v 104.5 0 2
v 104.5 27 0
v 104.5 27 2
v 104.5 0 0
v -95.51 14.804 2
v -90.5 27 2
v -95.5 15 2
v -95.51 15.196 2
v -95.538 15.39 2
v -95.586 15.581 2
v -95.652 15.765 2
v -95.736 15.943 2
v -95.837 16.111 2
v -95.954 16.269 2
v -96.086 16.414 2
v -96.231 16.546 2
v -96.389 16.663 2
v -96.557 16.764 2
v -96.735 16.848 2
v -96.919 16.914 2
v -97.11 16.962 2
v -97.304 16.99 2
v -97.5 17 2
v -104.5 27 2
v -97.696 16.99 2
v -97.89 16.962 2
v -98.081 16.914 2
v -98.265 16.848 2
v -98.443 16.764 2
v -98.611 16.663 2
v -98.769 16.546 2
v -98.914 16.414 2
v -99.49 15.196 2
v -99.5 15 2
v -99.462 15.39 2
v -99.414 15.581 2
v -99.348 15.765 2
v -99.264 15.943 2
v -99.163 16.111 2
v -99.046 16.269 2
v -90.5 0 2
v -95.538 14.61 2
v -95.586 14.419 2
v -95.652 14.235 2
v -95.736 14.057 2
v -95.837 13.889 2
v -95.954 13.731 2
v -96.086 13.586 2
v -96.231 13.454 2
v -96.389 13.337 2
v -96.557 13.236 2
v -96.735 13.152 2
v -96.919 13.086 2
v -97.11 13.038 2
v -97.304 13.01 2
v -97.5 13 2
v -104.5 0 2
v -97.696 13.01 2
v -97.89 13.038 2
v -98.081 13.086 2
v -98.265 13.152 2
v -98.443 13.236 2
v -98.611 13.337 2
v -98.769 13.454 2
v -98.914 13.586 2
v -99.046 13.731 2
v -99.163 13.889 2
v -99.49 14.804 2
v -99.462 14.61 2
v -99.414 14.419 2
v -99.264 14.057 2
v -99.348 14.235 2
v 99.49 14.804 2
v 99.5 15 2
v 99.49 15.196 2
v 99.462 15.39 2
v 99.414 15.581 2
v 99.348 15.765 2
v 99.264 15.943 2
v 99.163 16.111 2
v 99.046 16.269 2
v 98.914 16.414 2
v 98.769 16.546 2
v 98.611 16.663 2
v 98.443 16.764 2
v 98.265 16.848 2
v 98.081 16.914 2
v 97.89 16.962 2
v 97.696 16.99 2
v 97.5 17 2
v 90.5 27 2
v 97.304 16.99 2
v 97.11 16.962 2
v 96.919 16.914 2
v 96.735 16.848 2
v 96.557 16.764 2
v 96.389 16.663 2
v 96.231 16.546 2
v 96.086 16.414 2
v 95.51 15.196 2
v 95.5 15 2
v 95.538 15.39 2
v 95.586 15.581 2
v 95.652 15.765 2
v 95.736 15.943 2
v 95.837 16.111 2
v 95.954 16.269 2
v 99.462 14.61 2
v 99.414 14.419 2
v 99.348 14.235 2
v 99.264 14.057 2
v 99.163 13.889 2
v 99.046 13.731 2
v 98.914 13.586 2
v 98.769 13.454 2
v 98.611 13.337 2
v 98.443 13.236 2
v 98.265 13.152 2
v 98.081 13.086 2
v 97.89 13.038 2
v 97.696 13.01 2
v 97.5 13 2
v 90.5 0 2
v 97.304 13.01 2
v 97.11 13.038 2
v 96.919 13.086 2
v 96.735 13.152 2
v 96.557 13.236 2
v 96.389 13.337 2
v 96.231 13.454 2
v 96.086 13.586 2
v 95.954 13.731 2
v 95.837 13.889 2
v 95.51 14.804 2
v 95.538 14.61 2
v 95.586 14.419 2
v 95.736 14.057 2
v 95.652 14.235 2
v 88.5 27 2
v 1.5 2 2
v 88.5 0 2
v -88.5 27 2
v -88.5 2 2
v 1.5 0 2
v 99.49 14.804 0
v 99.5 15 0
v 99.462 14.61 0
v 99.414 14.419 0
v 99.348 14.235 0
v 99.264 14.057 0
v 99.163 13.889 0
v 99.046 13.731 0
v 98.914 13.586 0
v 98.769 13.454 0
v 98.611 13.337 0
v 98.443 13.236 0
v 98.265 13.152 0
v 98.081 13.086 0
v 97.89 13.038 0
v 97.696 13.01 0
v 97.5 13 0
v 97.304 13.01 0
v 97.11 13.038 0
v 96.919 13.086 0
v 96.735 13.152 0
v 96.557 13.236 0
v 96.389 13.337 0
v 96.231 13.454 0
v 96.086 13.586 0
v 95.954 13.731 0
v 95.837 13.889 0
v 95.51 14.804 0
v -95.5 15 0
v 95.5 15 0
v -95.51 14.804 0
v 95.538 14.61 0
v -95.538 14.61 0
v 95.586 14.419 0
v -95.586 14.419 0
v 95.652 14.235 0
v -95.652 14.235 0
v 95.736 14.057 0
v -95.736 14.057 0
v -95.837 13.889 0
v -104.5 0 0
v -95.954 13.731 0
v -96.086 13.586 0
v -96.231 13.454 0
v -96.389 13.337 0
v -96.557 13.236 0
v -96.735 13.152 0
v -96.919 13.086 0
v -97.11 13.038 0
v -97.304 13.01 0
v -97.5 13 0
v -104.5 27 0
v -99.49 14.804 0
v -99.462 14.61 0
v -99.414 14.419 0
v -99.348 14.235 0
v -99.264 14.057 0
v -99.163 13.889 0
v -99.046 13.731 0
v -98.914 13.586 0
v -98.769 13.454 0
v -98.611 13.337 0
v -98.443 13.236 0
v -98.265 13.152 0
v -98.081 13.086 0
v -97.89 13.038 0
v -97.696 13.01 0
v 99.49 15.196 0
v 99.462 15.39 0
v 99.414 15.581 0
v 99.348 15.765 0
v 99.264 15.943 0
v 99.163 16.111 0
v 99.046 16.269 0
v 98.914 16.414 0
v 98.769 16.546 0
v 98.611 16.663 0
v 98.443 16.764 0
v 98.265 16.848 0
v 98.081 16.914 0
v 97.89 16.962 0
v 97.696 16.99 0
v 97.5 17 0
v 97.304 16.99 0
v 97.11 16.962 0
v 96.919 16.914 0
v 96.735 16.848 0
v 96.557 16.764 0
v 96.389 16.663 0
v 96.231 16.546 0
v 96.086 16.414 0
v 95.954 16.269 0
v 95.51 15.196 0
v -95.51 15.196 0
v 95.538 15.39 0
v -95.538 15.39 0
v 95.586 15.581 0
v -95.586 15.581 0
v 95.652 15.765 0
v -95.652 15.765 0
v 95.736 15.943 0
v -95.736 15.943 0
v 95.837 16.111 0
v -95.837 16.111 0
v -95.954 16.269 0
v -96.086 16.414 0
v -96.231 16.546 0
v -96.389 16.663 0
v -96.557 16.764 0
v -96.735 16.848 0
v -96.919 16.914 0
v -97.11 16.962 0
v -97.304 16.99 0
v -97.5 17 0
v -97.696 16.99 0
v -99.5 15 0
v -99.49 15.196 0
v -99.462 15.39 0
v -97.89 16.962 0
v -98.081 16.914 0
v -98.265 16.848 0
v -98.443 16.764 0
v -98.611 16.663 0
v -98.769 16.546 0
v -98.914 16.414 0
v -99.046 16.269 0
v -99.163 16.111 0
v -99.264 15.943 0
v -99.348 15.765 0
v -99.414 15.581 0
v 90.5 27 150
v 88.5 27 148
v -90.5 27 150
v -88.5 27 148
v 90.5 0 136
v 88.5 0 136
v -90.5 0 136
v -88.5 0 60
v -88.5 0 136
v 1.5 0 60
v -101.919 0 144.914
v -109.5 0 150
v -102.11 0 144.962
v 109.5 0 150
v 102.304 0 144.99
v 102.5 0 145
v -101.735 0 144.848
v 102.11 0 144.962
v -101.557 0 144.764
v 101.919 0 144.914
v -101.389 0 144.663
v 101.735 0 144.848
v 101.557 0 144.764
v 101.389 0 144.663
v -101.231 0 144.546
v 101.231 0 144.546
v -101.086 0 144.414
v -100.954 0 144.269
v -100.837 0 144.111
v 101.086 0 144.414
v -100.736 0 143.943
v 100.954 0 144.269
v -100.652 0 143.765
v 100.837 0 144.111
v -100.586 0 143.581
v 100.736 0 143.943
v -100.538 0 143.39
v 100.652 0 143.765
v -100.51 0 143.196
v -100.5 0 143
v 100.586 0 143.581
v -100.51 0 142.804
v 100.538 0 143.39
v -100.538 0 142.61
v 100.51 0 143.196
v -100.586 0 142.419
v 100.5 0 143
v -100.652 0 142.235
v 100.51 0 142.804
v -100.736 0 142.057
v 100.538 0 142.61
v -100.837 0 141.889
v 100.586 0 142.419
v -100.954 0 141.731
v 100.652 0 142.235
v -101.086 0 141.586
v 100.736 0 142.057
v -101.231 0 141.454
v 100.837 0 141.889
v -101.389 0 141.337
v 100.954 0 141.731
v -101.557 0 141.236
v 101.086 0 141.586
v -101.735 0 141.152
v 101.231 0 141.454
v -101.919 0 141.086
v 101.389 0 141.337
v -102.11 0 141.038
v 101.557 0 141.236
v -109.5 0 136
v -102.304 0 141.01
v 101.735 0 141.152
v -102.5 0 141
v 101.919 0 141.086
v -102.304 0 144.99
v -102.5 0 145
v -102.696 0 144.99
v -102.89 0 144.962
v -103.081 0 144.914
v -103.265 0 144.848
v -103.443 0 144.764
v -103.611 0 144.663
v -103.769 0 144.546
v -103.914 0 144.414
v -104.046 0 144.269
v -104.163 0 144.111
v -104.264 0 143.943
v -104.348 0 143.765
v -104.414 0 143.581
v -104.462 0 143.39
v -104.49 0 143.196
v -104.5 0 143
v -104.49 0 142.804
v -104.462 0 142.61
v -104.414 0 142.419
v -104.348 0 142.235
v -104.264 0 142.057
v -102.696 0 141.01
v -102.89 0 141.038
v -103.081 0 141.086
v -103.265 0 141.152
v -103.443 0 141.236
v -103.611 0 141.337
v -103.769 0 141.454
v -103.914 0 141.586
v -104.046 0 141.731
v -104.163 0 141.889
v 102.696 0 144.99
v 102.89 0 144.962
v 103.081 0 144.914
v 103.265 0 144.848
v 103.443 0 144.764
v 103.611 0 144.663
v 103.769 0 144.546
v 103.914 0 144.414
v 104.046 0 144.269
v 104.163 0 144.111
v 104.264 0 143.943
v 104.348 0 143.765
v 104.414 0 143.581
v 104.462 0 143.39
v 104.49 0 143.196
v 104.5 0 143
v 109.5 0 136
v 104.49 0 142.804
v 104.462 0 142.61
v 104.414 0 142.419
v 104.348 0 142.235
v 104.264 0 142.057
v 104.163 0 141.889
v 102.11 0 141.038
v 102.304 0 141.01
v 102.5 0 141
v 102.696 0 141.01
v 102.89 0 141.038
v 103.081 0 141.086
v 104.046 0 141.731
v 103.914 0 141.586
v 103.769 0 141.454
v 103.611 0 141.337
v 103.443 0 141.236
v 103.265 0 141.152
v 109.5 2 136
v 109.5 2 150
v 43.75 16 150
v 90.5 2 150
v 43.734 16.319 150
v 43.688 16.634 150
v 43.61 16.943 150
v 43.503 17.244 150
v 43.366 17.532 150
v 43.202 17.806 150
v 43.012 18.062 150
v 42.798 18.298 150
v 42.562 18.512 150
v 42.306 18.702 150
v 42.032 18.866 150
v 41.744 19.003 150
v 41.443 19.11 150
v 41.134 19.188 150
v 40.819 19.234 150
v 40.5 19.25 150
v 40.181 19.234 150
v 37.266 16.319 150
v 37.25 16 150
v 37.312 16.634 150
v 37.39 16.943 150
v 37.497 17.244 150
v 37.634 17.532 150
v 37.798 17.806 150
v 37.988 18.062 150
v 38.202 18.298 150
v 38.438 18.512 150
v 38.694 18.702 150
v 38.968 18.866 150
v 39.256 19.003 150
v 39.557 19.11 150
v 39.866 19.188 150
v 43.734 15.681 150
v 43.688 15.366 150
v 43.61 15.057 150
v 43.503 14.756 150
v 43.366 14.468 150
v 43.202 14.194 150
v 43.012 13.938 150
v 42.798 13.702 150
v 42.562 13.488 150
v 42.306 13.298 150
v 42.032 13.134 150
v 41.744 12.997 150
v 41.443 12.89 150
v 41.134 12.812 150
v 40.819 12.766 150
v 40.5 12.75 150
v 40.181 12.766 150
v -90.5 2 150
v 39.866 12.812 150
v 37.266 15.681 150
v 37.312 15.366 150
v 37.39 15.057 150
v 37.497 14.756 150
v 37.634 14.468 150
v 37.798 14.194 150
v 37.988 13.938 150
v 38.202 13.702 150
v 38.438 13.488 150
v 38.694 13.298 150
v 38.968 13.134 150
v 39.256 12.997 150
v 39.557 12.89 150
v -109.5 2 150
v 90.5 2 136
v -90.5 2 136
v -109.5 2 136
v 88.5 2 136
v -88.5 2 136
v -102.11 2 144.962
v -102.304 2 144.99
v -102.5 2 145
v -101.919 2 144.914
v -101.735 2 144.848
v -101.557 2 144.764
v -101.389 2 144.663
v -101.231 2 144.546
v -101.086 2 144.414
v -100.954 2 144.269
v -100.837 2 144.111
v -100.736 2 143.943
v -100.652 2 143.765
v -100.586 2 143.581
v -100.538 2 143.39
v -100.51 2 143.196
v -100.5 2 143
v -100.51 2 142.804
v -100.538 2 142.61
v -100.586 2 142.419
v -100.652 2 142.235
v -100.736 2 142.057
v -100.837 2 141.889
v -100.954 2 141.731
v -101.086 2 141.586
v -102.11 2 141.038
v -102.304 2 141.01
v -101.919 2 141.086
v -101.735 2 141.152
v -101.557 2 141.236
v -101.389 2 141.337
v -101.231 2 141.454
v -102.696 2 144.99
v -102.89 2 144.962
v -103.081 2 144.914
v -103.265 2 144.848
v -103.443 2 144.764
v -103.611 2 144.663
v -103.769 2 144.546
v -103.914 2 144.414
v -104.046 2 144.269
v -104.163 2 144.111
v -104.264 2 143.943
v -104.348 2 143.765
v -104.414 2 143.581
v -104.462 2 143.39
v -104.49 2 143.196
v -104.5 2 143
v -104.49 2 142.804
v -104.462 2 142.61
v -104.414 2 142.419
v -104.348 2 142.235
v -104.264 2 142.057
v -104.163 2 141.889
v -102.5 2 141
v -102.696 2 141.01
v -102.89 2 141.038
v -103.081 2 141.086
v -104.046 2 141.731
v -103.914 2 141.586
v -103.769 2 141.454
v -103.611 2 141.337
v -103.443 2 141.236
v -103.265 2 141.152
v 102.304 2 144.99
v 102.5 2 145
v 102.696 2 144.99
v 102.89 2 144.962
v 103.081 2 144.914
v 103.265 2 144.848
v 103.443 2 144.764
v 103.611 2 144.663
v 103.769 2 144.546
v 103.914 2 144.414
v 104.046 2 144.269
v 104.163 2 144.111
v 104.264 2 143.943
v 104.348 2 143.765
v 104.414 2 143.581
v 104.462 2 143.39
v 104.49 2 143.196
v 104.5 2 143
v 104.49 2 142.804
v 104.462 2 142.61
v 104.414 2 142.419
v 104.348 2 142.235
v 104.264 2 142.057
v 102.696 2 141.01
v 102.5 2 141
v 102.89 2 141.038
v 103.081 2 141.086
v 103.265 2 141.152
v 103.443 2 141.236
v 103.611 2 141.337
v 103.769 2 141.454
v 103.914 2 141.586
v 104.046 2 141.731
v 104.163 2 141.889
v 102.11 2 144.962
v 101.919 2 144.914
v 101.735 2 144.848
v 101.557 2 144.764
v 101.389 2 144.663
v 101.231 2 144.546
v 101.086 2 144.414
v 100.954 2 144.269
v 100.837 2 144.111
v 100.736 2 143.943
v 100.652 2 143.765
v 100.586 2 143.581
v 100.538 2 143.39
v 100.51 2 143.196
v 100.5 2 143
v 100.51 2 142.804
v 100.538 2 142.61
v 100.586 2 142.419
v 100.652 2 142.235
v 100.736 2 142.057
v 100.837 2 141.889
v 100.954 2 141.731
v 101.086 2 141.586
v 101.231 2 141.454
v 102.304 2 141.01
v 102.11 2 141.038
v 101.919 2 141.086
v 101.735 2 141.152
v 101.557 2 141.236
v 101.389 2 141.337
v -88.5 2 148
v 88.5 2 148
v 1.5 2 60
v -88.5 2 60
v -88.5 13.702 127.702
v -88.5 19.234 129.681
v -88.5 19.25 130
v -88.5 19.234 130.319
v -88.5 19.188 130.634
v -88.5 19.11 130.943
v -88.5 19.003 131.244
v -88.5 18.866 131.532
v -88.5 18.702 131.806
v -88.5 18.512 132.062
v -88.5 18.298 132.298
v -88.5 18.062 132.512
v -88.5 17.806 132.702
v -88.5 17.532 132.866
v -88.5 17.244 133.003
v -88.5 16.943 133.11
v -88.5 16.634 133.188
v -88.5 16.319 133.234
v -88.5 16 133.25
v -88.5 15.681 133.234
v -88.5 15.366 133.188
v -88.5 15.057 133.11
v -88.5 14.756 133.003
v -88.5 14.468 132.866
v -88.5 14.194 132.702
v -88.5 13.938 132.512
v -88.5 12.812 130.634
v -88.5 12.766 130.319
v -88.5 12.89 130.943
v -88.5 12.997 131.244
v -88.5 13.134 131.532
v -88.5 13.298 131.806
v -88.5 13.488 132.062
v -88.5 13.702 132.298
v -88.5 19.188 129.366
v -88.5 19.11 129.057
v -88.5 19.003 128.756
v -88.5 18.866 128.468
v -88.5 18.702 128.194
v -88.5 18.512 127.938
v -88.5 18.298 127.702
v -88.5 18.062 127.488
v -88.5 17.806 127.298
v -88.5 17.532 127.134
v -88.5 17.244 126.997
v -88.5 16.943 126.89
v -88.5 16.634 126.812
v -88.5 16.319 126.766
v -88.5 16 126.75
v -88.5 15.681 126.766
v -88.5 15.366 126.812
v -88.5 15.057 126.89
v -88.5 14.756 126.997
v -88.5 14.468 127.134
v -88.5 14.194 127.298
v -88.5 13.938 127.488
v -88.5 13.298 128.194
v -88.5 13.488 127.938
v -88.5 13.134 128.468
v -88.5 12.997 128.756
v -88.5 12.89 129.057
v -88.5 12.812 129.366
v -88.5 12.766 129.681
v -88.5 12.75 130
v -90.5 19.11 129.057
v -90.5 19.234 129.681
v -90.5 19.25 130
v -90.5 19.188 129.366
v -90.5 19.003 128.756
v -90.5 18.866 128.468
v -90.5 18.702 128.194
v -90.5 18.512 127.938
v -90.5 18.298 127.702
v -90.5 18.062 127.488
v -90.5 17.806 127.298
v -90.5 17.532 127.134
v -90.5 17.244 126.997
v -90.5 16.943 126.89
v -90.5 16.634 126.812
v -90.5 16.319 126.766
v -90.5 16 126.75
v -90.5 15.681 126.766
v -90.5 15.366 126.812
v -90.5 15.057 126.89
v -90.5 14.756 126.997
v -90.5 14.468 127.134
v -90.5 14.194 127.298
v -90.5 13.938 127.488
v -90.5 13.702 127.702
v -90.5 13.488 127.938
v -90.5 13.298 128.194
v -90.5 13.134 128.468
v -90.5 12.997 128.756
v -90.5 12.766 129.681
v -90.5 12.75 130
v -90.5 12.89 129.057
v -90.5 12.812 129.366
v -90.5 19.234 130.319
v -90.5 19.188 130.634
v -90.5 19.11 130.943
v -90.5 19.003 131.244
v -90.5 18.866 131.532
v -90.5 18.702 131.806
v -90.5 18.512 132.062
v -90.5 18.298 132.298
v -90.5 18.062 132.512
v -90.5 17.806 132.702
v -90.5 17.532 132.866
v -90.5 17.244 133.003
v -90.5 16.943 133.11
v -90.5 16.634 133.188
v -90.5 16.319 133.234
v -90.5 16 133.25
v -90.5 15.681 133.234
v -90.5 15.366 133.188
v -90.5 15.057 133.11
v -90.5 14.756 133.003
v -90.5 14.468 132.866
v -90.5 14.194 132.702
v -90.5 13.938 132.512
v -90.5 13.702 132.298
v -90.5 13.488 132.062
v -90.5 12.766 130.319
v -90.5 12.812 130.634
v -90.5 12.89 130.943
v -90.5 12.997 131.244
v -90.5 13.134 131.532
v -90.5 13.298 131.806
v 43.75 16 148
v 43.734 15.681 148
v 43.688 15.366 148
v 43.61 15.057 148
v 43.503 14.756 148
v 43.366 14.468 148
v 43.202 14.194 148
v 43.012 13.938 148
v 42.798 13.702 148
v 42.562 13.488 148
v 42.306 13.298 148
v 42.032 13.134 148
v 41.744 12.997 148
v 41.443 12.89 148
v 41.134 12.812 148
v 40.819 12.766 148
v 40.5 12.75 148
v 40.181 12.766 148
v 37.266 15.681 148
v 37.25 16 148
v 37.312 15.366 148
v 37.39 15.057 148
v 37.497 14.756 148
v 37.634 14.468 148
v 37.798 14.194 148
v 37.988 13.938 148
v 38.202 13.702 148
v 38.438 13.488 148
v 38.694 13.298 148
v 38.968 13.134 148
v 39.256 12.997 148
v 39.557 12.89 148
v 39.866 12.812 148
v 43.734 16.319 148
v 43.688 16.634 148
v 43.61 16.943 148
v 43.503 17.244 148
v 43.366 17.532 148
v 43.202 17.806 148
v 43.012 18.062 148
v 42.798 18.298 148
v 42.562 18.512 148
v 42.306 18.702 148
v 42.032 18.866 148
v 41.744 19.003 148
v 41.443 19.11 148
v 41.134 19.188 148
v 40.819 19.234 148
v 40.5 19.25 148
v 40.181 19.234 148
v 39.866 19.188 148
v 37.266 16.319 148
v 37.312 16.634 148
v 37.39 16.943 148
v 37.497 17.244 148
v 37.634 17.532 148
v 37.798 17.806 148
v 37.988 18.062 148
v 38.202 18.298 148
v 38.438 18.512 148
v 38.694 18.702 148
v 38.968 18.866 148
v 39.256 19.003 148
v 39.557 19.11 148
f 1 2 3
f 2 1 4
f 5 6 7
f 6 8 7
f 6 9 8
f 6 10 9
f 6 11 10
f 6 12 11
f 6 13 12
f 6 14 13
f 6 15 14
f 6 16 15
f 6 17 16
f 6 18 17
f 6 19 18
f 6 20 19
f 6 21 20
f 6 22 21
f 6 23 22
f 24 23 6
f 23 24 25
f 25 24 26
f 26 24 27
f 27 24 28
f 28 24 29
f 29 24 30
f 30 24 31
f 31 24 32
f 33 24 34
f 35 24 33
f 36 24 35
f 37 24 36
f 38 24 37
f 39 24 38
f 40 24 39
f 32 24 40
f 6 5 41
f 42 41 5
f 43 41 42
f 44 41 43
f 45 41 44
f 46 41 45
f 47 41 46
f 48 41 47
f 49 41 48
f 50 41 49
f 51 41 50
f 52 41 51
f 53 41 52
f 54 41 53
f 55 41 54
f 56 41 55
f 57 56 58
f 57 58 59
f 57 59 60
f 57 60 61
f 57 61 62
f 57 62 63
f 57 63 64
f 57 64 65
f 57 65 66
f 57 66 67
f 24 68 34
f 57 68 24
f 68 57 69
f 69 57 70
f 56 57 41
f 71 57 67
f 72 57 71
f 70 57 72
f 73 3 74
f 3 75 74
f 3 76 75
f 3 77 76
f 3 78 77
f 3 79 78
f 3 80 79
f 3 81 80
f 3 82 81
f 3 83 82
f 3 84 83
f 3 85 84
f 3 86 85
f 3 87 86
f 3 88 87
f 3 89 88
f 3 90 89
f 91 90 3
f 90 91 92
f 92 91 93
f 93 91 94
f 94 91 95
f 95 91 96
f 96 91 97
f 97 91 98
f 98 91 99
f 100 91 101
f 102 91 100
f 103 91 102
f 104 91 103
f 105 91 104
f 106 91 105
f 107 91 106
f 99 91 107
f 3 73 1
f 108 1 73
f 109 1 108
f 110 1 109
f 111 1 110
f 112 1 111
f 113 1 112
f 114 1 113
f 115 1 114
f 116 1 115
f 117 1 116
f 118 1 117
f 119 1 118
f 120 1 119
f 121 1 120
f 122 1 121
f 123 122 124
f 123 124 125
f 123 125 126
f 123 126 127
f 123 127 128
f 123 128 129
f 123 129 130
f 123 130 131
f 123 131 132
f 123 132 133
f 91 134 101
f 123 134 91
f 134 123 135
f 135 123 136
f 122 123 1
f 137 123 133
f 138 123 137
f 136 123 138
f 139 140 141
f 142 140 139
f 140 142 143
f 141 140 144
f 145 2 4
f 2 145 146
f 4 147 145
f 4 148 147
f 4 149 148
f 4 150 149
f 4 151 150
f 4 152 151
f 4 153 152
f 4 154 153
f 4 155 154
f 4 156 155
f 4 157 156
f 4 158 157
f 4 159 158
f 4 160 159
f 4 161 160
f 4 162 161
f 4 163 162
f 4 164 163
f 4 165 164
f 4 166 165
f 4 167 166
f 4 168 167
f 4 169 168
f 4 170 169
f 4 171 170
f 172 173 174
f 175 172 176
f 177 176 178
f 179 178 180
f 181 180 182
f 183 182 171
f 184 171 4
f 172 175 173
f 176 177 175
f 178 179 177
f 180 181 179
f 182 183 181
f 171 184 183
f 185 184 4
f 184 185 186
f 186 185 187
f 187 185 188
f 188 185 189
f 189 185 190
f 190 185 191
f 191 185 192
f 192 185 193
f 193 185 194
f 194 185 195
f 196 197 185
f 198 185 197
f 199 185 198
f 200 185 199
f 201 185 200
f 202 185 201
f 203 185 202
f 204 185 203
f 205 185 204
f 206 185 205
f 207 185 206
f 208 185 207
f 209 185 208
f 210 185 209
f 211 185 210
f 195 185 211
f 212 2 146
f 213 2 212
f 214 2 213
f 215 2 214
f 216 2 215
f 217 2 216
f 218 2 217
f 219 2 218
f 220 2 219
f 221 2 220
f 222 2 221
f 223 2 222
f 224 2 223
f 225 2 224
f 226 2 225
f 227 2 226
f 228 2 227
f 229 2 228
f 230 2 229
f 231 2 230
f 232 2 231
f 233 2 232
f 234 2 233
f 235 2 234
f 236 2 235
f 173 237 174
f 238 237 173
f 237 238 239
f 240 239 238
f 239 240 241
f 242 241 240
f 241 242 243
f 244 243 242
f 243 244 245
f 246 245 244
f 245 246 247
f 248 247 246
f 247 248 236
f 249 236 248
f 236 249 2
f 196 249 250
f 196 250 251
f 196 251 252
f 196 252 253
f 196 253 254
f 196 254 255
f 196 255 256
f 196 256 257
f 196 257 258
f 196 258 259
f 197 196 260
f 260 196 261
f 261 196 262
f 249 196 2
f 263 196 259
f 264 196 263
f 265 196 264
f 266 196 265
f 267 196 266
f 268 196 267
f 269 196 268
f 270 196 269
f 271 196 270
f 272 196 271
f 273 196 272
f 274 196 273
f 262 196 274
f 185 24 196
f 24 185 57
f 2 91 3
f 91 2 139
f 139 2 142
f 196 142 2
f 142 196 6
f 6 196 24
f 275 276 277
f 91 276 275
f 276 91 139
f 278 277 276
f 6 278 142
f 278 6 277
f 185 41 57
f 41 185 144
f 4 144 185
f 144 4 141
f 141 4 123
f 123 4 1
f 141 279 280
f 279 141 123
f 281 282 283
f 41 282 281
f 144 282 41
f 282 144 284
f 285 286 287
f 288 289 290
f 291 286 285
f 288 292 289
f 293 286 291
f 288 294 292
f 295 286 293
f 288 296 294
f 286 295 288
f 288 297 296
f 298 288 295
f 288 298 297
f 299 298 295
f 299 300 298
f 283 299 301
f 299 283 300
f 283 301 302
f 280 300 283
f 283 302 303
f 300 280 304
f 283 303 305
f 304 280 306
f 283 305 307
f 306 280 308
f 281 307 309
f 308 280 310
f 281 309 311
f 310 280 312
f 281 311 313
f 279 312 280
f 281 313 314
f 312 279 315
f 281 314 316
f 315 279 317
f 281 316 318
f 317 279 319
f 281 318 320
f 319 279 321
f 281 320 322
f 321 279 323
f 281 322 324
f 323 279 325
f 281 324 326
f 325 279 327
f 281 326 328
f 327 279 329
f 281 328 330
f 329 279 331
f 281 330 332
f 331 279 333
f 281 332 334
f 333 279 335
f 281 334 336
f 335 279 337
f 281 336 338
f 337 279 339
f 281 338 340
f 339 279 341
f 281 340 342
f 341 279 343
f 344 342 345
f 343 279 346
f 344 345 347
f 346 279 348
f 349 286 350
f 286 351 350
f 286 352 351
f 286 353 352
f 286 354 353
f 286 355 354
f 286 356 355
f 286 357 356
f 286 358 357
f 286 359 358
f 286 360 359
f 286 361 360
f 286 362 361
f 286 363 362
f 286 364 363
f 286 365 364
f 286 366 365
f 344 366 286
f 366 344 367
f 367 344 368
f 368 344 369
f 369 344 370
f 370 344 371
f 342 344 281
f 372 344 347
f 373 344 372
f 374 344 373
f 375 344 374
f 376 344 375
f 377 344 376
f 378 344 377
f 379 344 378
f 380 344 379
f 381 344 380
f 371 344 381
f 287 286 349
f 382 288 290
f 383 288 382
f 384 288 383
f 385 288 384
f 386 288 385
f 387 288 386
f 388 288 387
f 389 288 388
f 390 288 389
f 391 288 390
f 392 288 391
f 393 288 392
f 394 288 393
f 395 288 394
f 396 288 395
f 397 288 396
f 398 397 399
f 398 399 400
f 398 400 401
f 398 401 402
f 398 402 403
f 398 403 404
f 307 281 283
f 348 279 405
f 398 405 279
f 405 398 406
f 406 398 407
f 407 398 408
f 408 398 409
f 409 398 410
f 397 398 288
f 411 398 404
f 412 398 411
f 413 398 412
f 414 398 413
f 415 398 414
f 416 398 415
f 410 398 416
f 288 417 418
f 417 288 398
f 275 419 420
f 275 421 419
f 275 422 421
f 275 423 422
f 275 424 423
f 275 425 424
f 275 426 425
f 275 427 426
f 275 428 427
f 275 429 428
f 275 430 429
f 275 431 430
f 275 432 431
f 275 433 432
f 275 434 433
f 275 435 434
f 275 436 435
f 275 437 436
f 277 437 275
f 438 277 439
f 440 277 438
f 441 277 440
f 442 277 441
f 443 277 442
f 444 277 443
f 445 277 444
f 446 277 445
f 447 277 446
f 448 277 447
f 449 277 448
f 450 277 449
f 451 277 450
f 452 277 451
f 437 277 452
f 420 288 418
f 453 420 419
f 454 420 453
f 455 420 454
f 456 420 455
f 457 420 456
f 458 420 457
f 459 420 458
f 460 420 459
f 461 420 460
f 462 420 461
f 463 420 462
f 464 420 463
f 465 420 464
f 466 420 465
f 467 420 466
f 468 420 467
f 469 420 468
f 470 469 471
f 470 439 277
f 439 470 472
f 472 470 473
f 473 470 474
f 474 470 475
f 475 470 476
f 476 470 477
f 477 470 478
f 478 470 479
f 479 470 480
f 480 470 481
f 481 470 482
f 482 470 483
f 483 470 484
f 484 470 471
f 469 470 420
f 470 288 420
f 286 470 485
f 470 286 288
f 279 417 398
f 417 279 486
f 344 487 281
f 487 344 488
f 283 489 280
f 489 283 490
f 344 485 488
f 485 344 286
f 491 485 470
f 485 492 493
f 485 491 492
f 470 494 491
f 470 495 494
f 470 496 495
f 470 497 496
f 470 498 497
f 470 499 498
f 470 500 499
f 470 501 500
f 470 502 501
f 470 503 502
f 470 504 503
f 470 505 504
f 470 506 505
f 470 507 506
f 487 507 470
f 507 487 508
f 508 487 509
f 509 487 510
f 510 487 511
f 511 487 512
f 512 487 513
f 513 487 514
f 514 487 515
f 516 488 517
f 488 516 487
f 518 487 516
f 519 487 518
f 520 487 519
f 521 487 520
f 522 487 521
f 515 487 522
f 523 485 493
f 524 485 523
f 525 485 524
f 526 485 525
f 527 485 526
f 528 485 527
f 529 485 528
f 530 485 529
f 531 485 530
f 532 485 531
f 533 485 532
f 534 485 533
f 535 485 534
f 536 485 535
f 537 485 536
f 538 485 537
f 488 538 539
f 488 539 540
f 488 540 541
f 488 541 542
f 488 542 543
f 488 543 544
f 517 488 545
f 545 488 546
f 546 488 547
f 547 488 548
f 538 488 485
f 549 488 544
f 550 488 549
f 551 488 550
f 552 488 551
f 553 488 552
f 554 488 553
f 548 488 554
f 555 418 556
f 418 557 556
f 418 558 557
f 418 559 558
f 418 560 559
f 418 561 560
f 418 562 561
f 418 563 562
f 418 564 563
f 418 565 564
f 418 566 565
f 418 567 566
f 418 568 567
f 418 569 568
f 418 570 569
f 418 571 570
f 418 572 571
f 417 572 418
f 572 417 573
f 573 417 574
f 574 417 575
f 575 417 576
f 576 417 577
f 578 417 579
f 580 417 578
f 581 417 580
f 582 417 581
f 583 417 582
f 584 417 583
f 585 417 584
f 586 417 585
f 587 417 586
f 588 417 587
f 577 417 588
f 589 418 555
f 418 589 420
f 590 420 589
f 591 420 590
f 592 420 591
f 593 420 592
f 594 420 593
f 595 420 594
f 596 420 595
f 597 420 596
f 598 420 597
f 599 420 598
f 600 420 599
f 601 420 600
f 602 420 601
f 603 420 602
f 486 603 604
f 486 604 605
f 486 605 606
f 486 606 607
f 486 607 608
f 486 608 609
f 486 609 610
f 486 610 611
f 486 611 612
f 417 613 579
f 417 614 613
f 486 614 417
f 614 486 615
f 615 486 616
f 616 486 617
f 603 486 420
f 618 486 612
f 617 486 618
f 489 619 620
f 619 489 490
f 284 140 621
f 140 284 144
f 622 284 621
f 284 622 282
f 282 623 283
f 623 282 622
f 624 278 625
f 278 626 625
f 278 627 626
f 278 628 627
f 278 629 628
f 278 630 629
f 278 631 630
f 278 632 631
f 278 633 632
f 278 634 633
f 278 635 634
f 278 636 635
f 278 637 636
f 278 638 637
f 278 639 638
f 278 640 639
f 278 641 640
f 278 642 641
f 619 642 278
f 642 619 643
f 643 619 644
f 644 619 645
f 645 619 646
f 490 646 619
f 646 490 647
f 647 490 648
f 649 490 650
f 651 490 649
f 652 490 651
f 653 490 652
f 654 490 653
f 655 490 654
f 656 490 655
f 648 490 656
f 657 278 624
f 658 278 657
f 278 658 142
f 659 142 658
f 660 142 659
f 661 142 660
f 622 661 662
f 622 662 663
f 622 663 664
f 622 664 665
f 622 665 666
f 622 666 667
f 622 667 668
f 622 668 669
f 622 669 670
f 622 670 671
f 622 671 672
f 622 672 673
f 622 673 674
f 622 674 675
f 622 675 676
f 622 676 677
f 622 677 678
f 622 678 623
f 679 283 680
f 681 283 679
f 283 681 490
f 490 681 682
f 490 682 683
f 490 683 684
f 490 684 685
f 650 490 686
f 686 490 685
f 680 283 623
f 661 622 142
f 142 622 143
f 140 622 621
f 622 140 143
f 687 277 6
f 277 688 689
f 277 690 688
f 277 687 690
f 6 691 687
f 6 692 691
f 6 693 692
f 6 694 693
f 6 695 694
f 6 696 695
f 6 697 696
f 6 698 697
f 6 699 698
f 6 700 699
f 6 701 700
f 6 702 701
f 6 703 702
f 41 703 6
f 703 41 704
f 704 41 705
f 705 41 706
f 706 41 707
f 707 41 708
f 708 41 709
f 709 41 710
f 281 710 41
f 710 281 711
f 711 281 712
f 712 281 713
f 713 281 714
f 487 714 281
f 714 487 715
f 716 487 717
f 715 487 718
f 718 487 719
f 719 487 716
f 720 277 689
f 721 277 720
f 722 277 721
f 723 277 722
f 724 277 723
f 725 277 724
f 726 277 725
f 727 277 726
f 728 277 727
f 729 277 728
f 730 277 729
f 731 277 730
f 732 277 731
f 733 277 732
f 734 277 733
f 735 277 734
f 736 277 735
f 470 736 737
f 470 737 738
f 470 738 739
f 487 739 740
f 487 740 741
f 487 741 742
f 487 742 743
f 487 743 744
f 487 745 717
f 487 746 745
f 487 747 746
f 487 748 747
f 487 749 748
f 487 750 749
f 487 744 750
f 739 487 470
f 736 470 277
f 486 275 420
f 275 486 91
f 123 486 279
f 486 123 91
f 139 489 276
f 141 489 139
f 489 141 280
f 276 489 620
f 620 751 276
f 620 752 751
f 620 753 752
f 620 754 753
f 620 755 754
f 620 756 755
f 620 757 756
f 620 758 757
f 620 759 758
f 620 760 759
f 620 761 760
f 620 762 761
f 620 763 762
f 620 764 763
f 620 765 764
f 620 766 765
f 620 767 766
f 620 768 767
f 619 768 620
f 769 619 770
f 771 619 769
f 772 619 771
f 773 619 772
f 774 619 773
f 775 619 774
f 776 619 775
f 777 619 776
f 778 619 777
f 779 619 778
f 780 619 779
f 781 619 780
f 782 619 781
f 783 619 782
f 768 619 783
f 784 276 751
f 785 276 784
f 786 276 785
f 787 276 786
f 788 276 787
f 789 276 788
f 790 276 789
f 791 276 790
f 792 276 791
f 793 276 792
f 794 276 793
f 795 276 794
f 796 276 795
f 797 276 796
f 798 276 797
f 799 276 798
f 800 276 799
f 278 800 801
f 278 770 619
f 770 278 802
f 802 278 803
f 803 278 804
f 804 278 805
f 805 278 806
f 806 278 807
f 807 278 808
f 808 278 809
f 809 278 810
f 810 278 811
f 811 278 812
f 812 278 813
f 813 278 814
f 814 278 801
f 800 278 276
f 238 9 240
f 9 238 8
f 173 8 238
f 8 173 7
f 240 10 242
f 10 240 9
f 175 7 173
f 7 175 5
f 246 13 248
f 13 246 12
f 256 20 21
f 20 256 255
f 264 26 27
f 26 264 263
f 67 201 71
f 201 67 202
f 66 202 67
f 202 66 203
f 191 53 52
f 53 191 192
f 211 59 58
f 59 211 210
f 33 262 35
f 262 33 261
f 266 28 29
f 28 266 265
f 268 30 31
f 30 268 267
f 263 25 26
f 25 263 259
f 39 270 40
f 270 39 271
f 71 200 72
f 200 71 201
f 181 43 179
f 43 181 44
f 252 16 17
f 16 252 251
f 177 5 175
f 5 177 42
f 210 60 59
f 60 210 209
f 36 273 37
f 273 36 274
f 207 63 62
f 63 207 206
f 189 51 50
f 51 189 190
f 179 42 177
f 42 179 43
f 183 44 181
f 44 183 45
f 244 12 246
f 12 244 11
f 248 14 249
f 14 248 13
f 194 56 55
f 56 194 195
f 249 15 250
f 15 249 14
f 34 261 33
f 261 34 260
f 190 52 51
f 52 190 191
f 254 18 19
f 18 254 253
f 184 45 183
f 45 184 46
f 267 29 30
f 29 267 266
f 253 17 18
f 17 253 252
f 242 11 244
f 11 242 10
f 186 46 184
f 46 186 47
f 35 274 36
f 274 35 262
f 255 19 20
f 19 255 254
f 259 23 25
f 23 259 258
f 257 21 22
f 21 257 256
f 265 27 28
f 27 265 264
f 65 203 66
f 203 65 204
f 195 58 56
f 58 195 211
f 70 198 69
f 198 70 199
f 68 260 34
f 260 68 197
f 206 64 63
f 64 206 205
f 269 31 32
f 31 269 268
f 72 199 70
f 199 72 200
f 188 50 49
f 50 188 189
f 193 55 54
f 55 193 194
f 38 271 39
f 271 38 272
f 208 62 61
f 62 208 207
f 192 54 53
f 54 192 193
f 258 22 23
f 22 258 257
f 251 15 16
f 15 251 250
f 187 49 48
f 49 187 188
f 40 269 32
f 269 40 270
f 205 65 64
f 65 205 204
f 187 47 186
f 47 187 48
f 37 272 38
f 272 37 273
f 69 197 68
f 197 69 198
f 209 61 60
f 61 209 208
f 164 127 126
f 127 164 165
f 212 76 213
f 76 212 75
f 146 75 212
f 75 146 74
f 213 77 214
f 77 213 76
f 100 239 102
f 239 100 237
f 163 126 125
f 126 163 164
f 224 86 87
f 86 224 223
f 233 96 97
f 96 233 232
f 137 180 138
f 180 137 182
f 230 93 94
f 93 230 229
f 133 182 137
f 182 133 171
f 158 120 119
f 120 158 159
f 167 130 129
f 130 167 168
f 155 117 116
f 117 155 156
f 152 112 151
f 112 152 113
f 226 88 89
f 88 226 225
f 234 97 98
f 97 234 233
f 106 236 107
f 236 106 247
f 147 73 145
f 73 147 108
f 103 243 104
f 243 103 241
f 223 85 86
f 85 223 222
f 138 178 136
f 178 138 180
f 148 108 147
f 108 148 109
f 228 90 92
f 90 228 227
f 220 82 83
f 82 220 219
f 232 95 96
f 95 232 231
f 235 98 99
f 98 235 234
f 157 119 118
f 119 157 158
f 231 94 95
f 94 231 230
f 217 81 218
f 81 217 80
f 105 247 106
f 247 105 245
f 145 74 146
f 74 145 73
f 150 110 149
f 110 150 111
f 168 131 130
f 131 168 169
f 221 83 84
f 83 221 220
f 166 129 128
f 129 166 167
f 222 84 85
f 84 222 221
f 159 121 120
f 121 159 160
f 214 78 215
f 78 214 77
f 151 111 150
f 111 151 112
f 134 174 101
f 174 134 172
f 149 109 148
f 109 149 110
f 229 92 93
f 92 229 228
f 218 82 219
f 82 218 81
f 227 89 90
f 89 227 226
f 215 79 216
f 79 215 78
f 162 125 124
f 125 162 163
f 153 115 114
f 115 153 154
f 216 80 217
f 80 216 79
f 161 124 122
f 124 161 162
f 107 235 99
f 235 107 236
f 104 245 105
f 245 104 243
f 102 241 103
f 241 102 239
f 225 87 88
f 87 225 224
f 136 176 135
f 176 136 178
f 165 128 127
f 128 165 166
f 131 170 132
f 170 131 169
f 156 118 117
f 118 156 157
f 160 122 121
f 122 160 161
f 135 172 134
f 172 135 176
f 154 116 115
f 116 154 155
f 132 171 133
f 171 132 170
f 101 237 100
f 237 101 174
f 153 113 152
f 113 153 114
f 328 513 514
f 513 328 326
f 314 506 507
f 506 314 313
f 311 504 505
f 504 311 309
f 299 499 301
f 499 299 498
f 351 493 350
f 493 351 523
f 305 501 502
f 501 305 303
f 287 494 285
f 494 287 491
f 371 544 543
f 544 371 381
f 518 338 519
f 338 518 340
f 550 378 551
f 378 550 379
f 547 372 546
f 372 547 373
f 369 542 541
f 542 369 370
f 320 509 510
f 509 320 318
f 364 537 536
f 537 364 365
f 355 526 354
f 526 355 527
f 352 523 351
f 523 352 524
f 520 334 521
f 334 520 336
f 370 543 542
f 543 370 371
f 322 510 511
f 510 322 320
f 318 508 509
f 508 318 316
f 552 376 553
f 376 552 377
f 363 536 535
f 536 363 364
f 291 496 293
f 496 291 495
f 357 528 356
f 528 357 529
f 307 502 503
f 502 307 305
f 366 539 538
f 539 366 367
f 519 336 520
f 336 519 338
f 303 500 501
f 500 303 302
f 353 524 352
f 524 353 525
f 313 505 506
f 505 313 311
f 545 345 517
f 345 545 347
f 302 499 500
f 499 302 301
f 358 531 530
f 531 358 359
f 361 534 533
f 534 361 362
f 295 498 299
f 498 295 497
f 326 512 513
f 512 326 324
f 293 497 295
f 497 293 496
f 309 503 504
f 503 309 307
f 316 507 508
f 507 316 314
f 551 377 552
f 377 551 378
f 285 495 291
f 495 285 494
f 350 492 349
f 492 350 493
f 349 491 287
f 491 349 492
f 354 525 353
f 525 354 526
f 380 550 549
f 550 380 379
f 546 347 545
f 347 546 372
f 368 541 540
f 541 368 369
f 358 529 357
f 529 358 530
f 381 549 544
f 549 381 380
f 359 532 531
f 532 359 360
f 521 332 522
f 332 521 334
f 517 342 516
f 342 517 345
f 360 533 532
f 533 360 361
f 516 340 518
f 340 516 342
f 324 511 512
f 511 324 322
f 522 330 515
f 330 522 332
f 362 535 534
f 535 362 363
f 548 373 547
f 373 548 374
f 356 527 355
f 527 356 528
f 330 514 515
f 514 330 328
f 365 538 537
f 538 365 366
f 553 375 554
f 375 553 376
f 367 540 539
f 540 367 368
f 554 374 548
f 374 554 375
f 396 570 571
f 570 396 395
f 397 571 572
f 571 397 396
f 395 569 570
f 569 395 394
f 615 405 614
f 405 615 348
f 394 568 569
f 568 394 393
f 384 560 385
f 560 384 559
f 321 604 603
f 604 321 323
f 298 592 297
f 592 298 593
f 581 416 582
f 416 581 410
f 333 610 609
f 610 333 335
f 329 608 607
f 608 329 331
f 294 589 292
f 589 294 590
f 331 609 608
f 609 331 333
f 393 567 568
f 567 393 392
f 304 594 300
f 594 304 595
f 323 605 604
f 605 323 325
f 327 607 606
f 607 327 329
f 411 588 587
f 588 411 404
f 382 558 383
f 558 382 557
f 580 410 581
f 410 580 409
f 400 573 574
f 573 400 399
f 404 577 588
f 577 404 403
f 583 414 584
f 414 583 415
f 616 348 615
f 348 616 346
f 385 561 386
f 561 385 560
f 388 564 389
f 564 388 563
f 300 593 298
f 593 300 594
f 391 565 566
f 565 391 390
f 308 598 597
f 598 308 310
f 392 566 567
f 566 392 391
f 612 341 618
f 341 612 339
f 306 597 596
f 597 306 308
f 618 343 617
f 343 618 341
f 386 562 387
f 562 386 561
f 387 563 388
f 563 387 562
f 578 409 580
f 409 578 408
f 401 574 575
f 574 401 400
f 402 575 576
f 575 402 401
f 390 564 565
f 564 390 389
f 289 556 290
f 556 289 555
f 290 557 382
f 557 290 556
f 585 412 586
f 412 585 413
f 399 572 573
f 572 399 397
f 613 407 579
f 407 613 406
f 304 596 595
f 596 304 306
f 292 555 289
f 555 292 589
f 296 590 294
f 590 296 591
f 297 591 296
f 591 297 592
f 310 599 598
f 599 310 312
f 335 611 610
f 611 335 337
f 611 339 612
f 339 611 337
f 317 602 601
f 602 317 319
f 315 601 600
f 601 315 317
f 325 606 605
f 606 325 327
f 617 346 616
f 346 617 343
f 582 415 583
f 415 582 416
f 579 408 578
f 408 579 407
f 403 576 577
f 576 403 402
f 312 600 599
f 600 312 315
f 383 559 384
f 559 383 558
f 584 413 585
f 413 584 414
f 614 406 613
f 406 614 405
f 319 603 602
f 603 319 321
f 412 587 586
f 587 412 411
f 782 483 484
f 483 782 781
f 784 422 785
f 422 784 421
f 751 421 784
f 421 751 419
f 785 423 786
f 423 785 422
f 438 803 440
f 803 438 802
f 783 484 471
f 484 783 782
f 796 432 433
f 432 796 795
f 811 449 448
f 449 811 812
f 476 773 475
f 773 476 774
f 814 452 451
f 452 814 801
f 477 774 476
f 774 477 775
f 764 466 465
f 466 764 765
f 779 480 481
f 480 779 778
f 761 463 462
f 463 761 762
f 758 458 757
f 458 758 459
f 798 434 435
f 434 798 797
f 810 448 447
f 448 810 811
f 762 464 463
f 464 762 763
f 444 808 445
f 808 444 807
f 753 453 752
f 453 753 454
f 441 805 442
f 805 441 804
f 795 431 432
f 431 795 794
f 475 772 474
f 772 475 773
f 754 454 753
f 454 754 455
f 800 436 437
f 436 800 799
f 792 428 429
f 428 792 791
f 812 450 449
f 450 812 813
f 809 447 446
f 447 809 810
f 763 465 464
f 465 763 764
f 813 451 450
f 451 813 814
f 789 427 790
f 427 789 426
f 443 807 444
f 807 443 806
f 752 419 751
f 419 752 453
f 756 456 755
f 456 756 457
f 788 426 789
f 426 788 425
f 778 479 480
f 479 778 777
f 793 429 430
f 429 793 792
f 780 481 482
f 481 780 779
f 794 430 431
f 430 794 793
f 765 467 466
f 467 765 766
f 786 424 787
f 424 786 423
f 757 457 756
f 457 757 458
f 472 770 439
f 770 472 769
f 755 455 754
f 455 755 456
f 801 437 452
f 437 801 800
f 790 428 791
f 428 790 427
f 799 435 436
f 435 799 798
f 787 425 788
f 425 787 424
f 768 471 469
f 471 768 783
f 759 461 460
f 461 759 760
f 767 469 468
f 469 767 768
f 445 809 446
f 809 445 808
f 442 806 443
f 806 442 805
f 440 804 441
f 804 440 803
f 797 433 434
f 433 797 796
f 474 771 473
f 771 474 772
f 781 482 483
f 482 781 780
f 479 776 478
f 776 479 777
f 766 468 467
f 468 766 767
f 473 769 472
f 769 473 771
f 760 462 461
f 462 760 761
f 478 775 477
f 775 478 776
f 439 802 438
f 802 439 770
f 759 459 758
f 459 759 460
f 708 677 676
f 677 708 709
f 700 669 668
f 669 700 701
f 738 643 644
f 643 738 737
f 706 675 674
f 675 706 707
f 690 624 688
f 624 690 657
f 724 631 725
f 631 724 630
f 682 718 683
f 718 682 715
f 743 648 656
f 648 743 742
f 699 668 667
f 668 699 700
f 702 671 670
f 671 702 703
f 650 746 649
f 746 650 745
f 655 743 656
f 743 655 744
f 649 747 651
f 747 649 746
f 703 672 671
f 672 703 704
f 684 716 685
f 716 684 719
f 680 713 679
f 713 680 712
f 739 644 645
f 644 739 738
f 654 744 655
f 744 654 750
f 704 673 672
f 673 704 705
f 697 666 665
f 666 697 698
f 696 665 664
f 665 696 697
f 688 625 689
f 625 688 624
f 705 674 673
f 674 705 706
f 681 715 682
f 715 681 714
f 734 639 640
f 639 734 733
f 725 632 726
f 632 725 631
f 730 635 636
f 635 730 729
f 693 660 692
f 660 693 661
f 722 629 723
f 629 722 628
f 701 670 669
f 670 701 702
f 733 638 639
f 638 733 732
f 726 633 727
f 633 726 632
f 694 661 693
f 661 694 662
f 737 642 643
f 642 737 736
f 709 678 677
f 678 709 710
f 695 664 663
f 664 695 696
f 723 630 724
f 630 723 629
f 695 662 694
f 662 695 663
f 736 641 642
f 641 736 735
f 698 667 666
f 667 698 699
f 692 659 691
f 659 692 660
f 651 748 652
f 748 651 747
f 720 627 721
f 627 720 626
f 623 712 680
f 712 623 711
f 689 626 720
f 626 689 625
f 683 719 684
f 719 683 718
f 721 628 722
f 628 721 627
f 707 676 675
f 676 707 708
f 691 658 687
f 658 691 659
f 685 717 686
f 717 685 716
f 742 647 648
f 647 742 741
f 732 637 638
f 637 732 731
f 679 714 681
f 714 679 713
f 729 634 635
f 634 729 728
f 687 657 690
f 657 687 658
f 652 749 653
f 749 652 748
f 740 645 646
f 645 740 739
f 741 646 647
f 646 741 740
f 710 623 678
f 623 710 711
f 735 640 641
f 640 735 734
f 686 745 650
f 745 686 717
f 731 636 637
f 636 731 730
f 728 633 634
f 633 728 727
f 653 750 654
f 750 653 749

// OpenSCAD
// file: parts/winegard_gm6000_logic_backplane.scad
// Parametric L-shaped replacement backplane for the Winegard GM-6000 Carryout G2+.
// This is a first-pass model based on hole spacing/offset measurements and margin assumptions.

module winegard_gm6000_logic_backplane() {
  hole_r = mount_hole_d / 2;
  base_hole_x = left_right_hole_spacing / 2;
  back_hole_x = base_hole_x + back_hole_outboard_offset;
  width = left_right_hole_spacing + mount_hole_d + 2 * side_edge_margin;
  base_depth_nominal = bottom_hole_from_back_edge + hole_r + front_edge_margin;
  base_depth = base_depth_nominal + box_depth_extension;
  back_height = back_hole_from_base_bottom + hole_r + top_edge_margin;
  // Replace the full back plate with a hole band that just covers the back holes
  // and fills the span between them.
  back_hole_band_w = 2 * (back_hole_x + hole_r + side_edge_margin);
  back_hole_band_h = mount_hole_d + 2 * top_edge_margin;
  back_hole_band_z0 = back_hole_from_base_bottom - hole_r - top_edge_margin;
  rib_t = inner_rib_thickness;
  rib_clear = inner_rib_hole_clearance;
  left_rib_face_x = -base_hole_x + hole_r + rib_clear;
  right_rib_face_x = base_hole_x - hole_r - rib_clear;
  left_rib_x = left_rib_face_x;
  right_rib_x = right_rib_face_x - rib_t;
  top_panel_x = left_rib_x + rib_t;
  top_panel_w = (right_rib_x) - top_panel_x;
  box_inner_left_x = top_panel_x;
  box_inner_right_x = right_rib_x;
  pi_patch_x0 = pi_mount_back_patch_on_user_right
    ? box_inner_left_x
    : (box_inner_right_x - pi_mount_back_patch_w);
  sma_r = sma_bulkhead_hole_d / 2;
  box_left_x = left_rib_x;
  box_right_x = right_rib_x + rib_t;
  // Preserve the pre-extension front-edge offset (the holes used to be centered front-to-back).
  sma_hole_front_offset = base_depth_nominal / 2;
  // Match user-facing left/right convention (mirrored relative to the model x-axis).
  top_hole_x = box_right_x - sma_top_hole_from_box_left;
  top_hole_y = base_depth - sma_hole_front_offset;
  right_side_hole_y = base_depth - sma_hole_front_offset;
  right_side_hole_z = back_height - sma_right_hole_from_box_top;
  eps = 0.1;

  assert(plate_thickness > 0, "plate_thickness must be > 0");
  assert(mount_hole_d > 0, "mount_hole_d must be > 0");
  assert(left_right_hole_spacing >= 0, "left_right_hole_spacing must be >= 0");
  assert(back_hole_outboard_offset >= 0, "back_hole_outboard_offset must be >= 0");
  assert(box_depth_extension >= 0, "box_depth_extension must be >= 0");
  assert(bottom_hole_from_back_edge > hole_r, "bottom_hole_from_back_edge must exceed hole radius");
  assert(back_hole_from_base_bottom > hole_r, "back_hole_from_base_bottom must exceed hole radius");
  assert(side_edge_margin >= 0, "side_edge_margin must be >= 0");
  assert(front_edge_margin >= 0, "front_edge_margin must be >= 0");
  assert(top_edge_margin >= 0, "top_edge_margin must be >= 0");
  assert(rib_t > 0, "inner_rib_thickness must be > 0");
  assert(rib_clear >= 0, "inner_rib_hole_clearance must be >= 0");
  assert(sma_bulkhead_hole_d > 0, "sma_bulkhead_hole_d must be > 0");
  assert(sma_top_hole_from_box_left >= 0, "sma_top_hole_from_box_left must be >= 0");
  assert(sma_right_hole_from_box_top >= 0, "sma_right_hole_from_box_top must be >= 0");
  assert(pi_mount_back_patch_w > 0, "pi_mount_back_patch_w must be > 0");
  assert(pi_mount_back_patch_h > 0, "pi_mount_back_patch_h must be > 0");
  assert(pi_mount_back_patch_z0 >= 0, "pi_mount_back_patch_z0 must be >= 0");
  assert(width > 0, "Derived width must be > 0");
  assert(base_depth > 0, "Derived base_depth must be > 0");
  assert(back_height > 0, "Derived back_height must be > 0");
  assert(back_hole_band_w > 0, "Derived back_hole_band_w must be > 0");
  assert(back_hole_band_h > 0, "Derived back_hole_band_h must be > 0");
  assert(back_hole_band_z0 >= 0, "Back-hole band falls below z=0");
  assert(base_hole_x + hole_r <= width / 2, "Base hole columns exceed part width");
  assert(back_hole_x + hole_r <= back_hole_band_w / 2, "Back-wall hole columns exceed back-hole band width");
  assert(left_rib_x >= -width / 2, "Left rib falls outside the part width");
  assert(right_rib_x + rib_t <= width / 2, "Right rib falls outside the part width");
  assert(top_panel_w > 0, "Ribs overlap; reduce inner_rib_thickness/clearance");
  assert(pi_patch_x0 >= box_inner_left_x, "Pi mount patch exceeds left interior bound");
  assert(pi_patch_x0 + pi_mount_back_patch_w <= box_inner_right_x, "Pi mount patch exceeds right interior bound");
  assert(pi_mount_back_patch_z0 + pi_mount_back_patch_h <= back_height, "Pi mount patch exceeds back height");
  assert(top_hole_x - sma_r >= top_panel_x, "Top SMA hole exceeds left edge of top panel");
  assert(top_hole_x + sma_r <= top_panel_x + top_panel_w, "Top SMA hole exceeds right edge of top panel");
  assert(top_hole_y - sma_r >= 0, "Top SMA hole exceeds back edge of top panel");
  assert(top_hole_y + sma_r <= base_depth, "Top SMA hole exceeds front edge of top panel");
  assert(right_side_hole_y - sma_r >= 0, "Right SMA hole exceeds back edge of side wall");
  assert(right_side_hole_y + sma_r <= base_depth, "Right SMA hole exceeds front edge of side wall");
  assert(right_side_hole_z - sma_r >= 0, "Right SMA hole exceeds bottom edge of side wall");
  assert(right_side_hole_z + sma_r <= back_height, "Right SMA hole exceeds top edge of side wall");
  assert(box_right_x > box_left_x, "Derived box width must be > 0");

  difference() {
    union() {
      // Horizontal base plate (extends away from the back wall in +y)
      translate([-width / 2, 0, 0]) cube([width, base_depth, plate_thickness], center = false);

      // Vertical back-hole band (rises at y=0, leaving most of the back open).
      translate([-back_hole_band_w / 2, 0, back_hole_band_z0])
        cube([back_hole_band_w, plate_thickness, back_hole_band_h], center = false);

      // Restored lower back patch for Raspberry Pi mounting area (inside the box).
      if (show_pi_mount_back_patch)
        translate([pi_patch_x0, 0, pi_mount_back_patch_z0])
          cube([pi_mount_back_patch_w, plate_thickness, pi_mount_back_patch_h], center = false);

      // Left/right internal side walls to create an open-front box section.
      translate([left_rib_x, 0, 0]) cube([rib_t, base_depth, back_height], center = false);
      translate([right_rib_x, 0, 0]) cube([rib_t, base_depth, back_height], center = false);

      // Top panel spanning between the ribs (front remains open).
      translate([top_panel_x, 0, back_height - plate_thickness])
        cube([top_panel_w, base_depth, plate_thickness], center = false);
    }

    for (x = [-base_hole_x, base_hole_x]) {
      // Base mounting holes (drill through z)
      translate([x, bottom_hole_from_back_edge, -eps])
        cylinder(d = mount_hole_d, h = plate_thickness + 2 * eps, $fn = hole_fn);
    }

    for (x = [-back_hole_x, back_hole_x]) {
      // Back-wall mounting holes (drill through y)
      translate([x, plate_thickness + eps, back_hole_from_base_bottom])
        rotate([90, 0, 0])
          cylinder(d = mount_hole_d, h = plate_thickness + 2 * eps, $fn = hole_fn);
    }

    // SMA bulkhead hole through the top panel (keeps original front-edge offset if box depth is extended).
    translate([top_hole_x, top_hole_y, back_height - plate_thickness - eps])
      cylinder(d = sma_bulkhead_hole_d, h = plate_thickness + 2 * eps, $fn = hole_fn);

    // SMA bulkhead hole through the user-facing right-side wall (same Y as top SMA hole).
    // This maps to the opposite x wall in the model coordinate frame.
    translate([left_rib_x - eps, right_side_hole_y, right_side_hole_z])
      rotate([0, 90, 0])
        cylinder(d = sma_bulkhead_hole_d, h = rib_t + 2 * eps, $fn = hole_fn);
  }
}
// file: lib/defaults.scad
// Project defaults (all dimensions in mm)
//
// Coordinate convention for this part:
// - x: left/right across the two hole pairs
// - y: base depth, extending away from the back wall
// - z: height, measured from the bottom of the base
//
// The back wall begins at y=0 and the base extends in +y.
// Base thickness is modeled from z=0..plate_thickness.

// Part selector (set via -D part_id=0/1/2...)
// NOTE: Numeric ids are safer than strings across shells/OSes.
part_id = 0; // 0=winegard_gm6000_logic_backplane

// Core geometry
plate_thickness = 2;
mount_hole_d = 4;

// Hole pattern
left_right_hole_spacing = 195;      // center-to-center, left to right
bottom_hole_from_back_edge = 15;    // base hole center from bend/back edge (y=0)
back_hole_from_base_bottom = 143;   // back hole center from bottom of base (z=0)
back_hole_outboard_offset = 5;      // shift each back-wall hole outward (+x/-x) relative to base-hole columns

// Outer edge extents beyond hole edges (first-pass assumptions)
side_edge_margin = 5;   // left/right beyond hole outer edges
front_edge_margin = 5;  // base front edge beyond base-hole outer edge
top_edge_margin = 5;    // back top edge beyond back-hole outer edge
box_depth_extension = 5; // extend the box/base depth further from the back without re-centering SMA holes

// Internal box-section reinforcement (open front)
// Ribs are placed inboard of the left/right hole columns; the nearest rib face
// is offset from the hole edge by this clearance (defaults to the side margin).
inner_rib_thickness = 2;
inner_rib_hole_clearance = 5;

// SMA bulkhead pass-through holes (typical clearance; adjust for actual hardware)
sma_bulkhead_hole_d = 6.5;
sma_top_hole_from_box_left = 50;       // top-panel hole center from left box wall outer face
sma_right_hole_from_box_top = 20;      // right-side hole center down from top edge

// Restored backplane area for Raspberry Pi mounting (vertical patch on the back face at y=0)
show_pi_mount_back_patch = true;
pi_mount_back_patch_w = 90;
pi_mount_back_patch_h = 60;
pi_mount_back_patch_z0 = 0;                 // bottom of patch from base bottom
pi_mount_back_patch_on_user_right = true;   // user-facing right (mirrored in model x-axis)

// Rendering quality for round holes
hole_fn = 64;
// main file
// Entry point for scripted exports.
// Usage:
//   openscad -o out.stl designs/winegard_gm6000_logic_backplane/src/main.scad -D part_id=0 ...

include <lib/defaults.scad>;
include <parts/winegard_gm6000_logic_backplane.scad>;

_part_id = is_undef(part_id) ? 0 : part_id;

if (_part_id == 0) {
  winegard_gm6000_logic_backplane();
} else {
  assert(false, str("Unknown part_id: ", _part_id));
}
